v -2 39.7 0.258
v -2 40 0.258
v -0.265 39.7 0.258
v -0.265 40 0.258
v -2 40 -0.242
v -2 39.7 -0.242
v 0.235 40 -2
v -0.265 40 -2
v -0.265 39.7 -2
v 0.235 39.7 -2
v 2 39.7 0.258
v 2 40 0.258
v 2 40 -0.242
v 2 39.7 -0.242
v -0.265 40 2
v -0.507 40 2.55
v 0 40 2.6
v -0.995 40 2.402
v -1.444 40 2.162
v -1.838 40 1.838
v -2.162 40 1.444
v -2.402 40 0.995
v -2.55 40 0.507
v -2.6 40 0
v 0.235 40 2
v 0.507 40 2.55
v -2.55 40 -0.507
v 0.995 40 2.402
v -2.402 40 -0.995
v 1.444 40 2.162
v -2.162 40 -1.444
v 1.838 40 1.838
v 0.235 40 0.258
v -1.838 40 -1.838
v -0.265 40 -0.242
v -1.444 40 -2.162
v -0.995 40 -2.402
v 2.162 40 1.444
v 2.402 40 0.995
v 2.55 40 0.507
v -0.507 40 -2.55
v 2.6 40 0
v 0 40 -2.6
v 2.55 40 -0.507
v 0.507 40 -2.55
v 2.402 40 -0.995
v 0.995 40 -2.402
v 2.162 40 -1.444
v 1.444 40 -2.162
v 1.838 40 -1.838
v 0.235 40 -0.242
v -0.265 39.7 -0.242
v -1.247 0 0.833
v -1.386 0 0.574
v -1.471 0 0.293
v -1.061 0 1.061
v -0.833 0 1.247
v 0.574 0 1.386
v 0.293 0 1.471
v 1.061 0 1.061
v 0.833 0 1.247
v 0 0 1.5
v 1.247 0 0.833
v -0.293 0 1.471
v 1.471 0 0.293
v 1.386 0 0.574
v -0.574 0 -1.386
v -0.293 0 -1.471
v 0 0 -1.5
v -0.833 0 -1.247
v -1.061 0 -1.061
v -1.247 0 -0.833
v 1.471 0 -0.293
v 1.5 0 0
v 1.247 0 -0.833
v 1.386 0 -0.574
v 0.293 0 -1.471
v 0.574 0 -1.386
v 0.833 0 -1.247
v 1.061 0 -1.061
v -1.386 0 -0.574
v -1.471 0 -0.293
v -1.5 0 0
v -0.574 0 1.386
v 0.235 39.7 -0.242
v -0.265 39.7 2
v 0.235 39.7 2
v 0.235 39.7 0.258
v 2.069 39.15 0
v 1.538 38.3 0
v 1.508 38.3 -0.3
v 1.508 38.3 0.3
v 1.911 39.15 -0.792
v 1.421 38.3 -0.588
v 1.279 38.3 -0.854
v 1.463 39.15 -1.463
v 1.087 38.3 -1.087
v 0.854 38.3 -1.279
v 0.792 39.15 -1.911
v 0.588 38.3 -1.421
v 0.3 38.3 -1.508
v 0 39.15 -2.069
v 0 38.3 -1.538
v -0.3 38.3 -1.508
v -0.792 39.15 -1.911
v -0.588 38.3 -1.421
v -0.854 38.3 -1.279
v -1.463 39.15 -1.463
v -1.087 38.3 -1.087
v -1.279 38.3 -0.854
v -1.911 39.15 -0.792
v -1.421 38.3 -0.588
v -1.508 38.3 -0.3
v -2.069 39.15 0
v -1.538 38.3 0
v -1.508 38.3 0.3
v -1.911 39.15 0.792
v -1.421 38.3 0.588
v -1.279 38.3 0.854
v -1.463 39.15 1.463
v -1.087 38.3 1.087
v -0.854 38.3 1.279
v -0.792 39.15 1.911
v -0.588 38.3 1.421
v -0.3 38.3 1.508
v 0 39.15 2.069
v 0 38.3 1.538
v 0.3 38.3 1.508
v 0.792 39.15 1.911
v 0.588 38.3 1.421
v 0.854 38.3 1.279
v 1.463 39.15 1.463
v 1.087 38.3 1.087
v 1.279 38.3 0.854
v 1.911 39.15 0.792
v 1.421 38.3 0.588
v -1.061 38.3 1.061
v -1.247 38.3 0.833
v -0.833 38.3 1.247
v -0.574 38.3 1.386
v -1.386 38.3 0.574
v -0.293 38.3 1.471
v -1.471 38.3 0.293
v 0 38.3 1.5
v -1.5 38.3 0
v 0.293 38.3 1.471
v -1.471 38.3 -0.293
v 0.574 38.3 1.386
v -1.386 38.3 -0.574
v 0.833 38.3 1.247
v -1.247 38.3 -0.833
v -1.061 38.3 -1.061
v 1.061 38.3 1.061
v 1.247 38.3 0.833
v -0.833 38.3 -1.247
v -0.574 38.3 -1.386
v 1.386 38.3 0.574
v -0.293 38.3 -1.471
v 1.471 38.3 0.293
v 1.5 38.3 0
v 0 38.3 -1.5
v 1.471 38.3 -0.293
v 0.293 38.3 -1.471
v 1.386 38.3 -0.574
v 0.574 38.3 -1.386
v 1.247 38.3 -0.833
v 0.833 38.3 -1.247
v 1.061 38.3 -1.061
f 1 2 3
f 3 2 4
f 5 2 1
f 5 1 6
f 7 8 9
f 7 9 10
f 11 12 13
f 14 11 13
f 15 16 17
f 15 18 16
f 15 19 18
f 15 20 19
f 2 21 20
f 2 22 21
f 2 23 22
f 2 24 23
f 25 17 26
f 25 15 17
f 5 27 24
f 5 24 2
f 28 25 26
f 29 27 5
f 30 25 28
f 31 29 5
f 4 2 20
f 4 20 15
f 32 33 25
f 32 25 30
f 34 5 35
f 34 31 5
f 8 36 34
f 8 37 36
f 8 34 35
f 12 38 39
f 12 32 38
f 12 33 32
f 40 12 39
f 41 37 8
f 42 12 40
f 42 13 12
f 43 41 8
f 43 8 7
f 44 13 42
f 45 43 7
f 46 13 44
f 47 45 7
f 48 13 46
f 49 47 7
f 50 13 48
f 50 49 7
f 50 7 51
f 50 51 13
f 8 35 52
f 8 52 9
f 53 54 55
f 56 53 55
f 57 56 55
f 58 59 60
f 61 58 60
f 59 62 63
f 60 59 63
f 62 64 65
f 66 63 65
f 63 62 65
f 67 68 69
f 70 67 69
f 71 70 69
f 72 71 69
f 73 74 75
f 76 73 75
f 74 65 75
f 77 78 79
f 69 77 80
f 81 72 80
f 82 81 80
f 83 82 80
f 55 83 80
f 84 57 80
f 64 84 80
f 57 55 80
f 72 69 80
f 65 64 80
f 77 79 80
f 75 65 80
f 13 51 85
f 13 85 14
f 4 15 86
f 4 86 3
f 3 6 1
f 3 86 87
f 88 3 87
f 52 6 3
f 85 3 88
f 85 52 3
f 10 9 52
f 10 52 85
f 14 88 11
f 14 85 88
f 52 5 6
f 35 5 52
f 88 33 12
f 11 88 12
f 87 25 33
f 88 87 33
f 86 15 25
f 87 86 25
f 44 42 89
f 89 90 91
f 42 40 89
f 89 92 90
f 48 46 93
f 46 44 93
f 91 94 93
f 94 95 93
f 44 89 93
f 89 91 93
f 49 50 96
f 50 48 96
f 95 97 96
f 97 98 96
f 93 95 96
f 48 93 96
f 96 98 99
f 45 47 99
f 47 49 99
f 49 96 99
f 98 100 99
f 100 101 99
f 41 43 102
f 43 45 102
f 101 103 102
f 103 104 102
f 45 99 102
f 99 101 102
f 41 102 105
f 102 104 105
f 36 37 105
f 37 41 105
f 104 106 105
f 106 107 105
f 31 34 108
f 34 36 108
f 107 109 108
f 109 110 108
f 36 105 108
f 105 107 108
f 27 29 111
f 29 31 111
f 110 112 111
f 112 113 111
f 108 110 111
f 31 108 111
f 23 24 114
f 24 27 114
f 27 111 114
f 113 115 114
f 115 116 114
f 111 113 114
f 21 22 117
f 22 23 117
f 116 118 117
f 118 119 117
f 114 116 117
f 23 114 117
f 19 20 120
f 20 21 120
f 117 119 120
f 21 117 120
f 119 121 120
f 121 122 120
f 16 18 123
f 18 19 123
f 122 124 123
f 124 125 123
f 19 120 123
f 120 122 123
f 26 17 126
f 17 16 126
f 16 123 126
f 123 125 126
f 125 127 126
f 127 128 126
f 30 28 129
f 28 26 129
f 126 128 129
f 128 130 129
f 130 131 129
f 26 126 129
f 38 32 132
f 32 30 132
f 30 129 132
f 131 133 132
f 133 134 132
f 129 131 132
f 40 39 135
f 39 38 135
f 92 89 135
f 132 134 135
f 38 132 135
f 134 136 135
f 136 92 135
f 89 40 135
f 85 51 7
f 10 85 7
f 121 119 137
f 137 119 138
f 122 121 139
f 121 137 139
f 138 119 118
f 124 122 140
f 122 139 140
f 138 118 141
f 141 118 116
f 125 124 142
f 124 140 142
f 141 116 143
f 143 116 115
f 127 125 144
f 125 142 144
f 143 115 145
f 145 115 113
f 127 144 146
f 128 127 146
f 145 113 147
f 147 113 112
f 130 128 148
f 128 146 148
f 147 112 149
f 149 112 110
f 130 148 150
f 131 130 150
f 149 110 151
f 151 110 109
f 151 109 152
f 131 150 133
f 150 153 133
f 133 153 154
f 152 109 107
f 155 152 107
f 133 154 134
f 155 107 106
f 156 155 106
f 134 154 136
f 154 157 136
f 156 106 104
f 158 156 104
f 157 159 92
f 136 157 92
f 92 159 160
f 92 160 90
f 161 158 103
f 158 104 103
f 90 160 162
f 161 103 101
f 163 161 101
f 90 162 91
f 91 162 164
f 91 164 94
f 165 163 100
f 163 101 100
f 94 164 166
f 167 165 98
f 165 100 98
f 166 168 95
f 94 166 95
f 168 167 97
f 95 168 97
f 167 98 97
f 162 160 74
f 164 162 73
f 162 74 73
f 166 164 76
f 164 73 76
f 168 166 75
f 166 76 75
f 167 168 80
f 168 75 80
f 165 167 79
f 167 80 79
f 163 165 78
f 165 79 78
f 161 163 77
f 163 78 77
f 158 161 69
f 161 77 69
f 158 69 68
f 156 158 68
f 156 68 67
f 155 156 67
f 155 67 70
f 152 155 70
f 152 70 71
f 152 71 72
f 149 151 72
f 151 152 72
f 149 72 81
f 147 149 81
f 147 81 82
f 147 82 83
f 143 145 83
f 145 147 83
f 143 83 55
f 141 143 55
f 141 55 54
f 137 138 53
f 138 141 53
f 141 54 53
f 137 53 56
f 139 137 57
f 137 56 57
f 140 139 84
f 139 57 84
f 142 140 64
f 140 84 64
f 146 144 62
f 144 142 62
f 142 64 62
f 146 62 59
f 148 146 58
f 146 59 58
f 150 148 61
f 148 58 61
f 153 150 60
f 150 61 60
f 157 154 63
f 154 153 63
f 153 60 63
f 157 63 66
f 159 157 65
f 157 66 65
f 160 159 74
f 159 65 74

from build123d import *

# Parameters (mm, degrees)
SKETCH1_R           = 1.5
BOSS_EXTRUDE1_DEPTH = 40
SKETCH2_R           = 2.6
BOSS_EXTRUDE2_DEPTH = 1.7
BOSS_EXTRUDE2_TAPER = 32
SKETCH3_W           = 0.5
SKETCH3_H           = 1.758378485
SKETCH3_H_2         = 1.741621515
SKETCH3_W_2         = 1.734727157
SKETCH3_H_3         = 0.5
SKETCH3_W_3         = 1.765272843
CUT_EXTRUDE1_DEPTH  = 0.3


with BuildPart() as part:
    # Sketch1 → Boss-Extrude1 (new body)
    with BuildSketch(Plane(origin=(0, 0, 0), x_dir=(1, 0, 0), z_dir=(0, 1, 0))):
        Circle(SKETCH1_R)
    extrude(amount=BOSS_EXTRUDE1_DEPTH)

    # Sketch2 → Boss-Extrude2 (add)
    with BuildSketch(Plane(origin=(0, 40, 0), x_dir=(1, 0, 0), z_dir=(0, 1, 0))):
        Circle(SKETCH2_R)
    extrude(amount=-BOSS_EXTRUDE2_DEPTH, taper=BOSS_EXTRUDE2_TAPER)

    # Sketch3 → Cut-Extrude1 (cut)
    with BuildSketch(Plane(origin=(0, 40, 0), x_dir=(1, 0, 0), z_dir=(0, 1, 0))):
        with Locations((-0.015272843, 1.120810757)):
            Rectangle(SKETCH3_W, SKETCH3_H)
        with Locations((-0.015272843, -1.129189243)):
            Rectangle(SKETCH3_W, SKETCH3_H_2)
        with Locations((-1.132636421, -0.008378485)):
            Rectangle(SKETCH3_W_2, SKETCH3_H_3)
        with Locations((1.117363579, -0.008378485)):
            Rectangle(SKETCH3_W_3, SKETCH3_H_3)
        with Locations((-0.015272843, -0.008378485)):
            Rectangle(SKETCH3_W, SKETCH3_H_3)
    extrude(amount=-CUT_EXTRUDE1_DEPTH, mode=Mode.SUBTRACT)


solid = part.part
